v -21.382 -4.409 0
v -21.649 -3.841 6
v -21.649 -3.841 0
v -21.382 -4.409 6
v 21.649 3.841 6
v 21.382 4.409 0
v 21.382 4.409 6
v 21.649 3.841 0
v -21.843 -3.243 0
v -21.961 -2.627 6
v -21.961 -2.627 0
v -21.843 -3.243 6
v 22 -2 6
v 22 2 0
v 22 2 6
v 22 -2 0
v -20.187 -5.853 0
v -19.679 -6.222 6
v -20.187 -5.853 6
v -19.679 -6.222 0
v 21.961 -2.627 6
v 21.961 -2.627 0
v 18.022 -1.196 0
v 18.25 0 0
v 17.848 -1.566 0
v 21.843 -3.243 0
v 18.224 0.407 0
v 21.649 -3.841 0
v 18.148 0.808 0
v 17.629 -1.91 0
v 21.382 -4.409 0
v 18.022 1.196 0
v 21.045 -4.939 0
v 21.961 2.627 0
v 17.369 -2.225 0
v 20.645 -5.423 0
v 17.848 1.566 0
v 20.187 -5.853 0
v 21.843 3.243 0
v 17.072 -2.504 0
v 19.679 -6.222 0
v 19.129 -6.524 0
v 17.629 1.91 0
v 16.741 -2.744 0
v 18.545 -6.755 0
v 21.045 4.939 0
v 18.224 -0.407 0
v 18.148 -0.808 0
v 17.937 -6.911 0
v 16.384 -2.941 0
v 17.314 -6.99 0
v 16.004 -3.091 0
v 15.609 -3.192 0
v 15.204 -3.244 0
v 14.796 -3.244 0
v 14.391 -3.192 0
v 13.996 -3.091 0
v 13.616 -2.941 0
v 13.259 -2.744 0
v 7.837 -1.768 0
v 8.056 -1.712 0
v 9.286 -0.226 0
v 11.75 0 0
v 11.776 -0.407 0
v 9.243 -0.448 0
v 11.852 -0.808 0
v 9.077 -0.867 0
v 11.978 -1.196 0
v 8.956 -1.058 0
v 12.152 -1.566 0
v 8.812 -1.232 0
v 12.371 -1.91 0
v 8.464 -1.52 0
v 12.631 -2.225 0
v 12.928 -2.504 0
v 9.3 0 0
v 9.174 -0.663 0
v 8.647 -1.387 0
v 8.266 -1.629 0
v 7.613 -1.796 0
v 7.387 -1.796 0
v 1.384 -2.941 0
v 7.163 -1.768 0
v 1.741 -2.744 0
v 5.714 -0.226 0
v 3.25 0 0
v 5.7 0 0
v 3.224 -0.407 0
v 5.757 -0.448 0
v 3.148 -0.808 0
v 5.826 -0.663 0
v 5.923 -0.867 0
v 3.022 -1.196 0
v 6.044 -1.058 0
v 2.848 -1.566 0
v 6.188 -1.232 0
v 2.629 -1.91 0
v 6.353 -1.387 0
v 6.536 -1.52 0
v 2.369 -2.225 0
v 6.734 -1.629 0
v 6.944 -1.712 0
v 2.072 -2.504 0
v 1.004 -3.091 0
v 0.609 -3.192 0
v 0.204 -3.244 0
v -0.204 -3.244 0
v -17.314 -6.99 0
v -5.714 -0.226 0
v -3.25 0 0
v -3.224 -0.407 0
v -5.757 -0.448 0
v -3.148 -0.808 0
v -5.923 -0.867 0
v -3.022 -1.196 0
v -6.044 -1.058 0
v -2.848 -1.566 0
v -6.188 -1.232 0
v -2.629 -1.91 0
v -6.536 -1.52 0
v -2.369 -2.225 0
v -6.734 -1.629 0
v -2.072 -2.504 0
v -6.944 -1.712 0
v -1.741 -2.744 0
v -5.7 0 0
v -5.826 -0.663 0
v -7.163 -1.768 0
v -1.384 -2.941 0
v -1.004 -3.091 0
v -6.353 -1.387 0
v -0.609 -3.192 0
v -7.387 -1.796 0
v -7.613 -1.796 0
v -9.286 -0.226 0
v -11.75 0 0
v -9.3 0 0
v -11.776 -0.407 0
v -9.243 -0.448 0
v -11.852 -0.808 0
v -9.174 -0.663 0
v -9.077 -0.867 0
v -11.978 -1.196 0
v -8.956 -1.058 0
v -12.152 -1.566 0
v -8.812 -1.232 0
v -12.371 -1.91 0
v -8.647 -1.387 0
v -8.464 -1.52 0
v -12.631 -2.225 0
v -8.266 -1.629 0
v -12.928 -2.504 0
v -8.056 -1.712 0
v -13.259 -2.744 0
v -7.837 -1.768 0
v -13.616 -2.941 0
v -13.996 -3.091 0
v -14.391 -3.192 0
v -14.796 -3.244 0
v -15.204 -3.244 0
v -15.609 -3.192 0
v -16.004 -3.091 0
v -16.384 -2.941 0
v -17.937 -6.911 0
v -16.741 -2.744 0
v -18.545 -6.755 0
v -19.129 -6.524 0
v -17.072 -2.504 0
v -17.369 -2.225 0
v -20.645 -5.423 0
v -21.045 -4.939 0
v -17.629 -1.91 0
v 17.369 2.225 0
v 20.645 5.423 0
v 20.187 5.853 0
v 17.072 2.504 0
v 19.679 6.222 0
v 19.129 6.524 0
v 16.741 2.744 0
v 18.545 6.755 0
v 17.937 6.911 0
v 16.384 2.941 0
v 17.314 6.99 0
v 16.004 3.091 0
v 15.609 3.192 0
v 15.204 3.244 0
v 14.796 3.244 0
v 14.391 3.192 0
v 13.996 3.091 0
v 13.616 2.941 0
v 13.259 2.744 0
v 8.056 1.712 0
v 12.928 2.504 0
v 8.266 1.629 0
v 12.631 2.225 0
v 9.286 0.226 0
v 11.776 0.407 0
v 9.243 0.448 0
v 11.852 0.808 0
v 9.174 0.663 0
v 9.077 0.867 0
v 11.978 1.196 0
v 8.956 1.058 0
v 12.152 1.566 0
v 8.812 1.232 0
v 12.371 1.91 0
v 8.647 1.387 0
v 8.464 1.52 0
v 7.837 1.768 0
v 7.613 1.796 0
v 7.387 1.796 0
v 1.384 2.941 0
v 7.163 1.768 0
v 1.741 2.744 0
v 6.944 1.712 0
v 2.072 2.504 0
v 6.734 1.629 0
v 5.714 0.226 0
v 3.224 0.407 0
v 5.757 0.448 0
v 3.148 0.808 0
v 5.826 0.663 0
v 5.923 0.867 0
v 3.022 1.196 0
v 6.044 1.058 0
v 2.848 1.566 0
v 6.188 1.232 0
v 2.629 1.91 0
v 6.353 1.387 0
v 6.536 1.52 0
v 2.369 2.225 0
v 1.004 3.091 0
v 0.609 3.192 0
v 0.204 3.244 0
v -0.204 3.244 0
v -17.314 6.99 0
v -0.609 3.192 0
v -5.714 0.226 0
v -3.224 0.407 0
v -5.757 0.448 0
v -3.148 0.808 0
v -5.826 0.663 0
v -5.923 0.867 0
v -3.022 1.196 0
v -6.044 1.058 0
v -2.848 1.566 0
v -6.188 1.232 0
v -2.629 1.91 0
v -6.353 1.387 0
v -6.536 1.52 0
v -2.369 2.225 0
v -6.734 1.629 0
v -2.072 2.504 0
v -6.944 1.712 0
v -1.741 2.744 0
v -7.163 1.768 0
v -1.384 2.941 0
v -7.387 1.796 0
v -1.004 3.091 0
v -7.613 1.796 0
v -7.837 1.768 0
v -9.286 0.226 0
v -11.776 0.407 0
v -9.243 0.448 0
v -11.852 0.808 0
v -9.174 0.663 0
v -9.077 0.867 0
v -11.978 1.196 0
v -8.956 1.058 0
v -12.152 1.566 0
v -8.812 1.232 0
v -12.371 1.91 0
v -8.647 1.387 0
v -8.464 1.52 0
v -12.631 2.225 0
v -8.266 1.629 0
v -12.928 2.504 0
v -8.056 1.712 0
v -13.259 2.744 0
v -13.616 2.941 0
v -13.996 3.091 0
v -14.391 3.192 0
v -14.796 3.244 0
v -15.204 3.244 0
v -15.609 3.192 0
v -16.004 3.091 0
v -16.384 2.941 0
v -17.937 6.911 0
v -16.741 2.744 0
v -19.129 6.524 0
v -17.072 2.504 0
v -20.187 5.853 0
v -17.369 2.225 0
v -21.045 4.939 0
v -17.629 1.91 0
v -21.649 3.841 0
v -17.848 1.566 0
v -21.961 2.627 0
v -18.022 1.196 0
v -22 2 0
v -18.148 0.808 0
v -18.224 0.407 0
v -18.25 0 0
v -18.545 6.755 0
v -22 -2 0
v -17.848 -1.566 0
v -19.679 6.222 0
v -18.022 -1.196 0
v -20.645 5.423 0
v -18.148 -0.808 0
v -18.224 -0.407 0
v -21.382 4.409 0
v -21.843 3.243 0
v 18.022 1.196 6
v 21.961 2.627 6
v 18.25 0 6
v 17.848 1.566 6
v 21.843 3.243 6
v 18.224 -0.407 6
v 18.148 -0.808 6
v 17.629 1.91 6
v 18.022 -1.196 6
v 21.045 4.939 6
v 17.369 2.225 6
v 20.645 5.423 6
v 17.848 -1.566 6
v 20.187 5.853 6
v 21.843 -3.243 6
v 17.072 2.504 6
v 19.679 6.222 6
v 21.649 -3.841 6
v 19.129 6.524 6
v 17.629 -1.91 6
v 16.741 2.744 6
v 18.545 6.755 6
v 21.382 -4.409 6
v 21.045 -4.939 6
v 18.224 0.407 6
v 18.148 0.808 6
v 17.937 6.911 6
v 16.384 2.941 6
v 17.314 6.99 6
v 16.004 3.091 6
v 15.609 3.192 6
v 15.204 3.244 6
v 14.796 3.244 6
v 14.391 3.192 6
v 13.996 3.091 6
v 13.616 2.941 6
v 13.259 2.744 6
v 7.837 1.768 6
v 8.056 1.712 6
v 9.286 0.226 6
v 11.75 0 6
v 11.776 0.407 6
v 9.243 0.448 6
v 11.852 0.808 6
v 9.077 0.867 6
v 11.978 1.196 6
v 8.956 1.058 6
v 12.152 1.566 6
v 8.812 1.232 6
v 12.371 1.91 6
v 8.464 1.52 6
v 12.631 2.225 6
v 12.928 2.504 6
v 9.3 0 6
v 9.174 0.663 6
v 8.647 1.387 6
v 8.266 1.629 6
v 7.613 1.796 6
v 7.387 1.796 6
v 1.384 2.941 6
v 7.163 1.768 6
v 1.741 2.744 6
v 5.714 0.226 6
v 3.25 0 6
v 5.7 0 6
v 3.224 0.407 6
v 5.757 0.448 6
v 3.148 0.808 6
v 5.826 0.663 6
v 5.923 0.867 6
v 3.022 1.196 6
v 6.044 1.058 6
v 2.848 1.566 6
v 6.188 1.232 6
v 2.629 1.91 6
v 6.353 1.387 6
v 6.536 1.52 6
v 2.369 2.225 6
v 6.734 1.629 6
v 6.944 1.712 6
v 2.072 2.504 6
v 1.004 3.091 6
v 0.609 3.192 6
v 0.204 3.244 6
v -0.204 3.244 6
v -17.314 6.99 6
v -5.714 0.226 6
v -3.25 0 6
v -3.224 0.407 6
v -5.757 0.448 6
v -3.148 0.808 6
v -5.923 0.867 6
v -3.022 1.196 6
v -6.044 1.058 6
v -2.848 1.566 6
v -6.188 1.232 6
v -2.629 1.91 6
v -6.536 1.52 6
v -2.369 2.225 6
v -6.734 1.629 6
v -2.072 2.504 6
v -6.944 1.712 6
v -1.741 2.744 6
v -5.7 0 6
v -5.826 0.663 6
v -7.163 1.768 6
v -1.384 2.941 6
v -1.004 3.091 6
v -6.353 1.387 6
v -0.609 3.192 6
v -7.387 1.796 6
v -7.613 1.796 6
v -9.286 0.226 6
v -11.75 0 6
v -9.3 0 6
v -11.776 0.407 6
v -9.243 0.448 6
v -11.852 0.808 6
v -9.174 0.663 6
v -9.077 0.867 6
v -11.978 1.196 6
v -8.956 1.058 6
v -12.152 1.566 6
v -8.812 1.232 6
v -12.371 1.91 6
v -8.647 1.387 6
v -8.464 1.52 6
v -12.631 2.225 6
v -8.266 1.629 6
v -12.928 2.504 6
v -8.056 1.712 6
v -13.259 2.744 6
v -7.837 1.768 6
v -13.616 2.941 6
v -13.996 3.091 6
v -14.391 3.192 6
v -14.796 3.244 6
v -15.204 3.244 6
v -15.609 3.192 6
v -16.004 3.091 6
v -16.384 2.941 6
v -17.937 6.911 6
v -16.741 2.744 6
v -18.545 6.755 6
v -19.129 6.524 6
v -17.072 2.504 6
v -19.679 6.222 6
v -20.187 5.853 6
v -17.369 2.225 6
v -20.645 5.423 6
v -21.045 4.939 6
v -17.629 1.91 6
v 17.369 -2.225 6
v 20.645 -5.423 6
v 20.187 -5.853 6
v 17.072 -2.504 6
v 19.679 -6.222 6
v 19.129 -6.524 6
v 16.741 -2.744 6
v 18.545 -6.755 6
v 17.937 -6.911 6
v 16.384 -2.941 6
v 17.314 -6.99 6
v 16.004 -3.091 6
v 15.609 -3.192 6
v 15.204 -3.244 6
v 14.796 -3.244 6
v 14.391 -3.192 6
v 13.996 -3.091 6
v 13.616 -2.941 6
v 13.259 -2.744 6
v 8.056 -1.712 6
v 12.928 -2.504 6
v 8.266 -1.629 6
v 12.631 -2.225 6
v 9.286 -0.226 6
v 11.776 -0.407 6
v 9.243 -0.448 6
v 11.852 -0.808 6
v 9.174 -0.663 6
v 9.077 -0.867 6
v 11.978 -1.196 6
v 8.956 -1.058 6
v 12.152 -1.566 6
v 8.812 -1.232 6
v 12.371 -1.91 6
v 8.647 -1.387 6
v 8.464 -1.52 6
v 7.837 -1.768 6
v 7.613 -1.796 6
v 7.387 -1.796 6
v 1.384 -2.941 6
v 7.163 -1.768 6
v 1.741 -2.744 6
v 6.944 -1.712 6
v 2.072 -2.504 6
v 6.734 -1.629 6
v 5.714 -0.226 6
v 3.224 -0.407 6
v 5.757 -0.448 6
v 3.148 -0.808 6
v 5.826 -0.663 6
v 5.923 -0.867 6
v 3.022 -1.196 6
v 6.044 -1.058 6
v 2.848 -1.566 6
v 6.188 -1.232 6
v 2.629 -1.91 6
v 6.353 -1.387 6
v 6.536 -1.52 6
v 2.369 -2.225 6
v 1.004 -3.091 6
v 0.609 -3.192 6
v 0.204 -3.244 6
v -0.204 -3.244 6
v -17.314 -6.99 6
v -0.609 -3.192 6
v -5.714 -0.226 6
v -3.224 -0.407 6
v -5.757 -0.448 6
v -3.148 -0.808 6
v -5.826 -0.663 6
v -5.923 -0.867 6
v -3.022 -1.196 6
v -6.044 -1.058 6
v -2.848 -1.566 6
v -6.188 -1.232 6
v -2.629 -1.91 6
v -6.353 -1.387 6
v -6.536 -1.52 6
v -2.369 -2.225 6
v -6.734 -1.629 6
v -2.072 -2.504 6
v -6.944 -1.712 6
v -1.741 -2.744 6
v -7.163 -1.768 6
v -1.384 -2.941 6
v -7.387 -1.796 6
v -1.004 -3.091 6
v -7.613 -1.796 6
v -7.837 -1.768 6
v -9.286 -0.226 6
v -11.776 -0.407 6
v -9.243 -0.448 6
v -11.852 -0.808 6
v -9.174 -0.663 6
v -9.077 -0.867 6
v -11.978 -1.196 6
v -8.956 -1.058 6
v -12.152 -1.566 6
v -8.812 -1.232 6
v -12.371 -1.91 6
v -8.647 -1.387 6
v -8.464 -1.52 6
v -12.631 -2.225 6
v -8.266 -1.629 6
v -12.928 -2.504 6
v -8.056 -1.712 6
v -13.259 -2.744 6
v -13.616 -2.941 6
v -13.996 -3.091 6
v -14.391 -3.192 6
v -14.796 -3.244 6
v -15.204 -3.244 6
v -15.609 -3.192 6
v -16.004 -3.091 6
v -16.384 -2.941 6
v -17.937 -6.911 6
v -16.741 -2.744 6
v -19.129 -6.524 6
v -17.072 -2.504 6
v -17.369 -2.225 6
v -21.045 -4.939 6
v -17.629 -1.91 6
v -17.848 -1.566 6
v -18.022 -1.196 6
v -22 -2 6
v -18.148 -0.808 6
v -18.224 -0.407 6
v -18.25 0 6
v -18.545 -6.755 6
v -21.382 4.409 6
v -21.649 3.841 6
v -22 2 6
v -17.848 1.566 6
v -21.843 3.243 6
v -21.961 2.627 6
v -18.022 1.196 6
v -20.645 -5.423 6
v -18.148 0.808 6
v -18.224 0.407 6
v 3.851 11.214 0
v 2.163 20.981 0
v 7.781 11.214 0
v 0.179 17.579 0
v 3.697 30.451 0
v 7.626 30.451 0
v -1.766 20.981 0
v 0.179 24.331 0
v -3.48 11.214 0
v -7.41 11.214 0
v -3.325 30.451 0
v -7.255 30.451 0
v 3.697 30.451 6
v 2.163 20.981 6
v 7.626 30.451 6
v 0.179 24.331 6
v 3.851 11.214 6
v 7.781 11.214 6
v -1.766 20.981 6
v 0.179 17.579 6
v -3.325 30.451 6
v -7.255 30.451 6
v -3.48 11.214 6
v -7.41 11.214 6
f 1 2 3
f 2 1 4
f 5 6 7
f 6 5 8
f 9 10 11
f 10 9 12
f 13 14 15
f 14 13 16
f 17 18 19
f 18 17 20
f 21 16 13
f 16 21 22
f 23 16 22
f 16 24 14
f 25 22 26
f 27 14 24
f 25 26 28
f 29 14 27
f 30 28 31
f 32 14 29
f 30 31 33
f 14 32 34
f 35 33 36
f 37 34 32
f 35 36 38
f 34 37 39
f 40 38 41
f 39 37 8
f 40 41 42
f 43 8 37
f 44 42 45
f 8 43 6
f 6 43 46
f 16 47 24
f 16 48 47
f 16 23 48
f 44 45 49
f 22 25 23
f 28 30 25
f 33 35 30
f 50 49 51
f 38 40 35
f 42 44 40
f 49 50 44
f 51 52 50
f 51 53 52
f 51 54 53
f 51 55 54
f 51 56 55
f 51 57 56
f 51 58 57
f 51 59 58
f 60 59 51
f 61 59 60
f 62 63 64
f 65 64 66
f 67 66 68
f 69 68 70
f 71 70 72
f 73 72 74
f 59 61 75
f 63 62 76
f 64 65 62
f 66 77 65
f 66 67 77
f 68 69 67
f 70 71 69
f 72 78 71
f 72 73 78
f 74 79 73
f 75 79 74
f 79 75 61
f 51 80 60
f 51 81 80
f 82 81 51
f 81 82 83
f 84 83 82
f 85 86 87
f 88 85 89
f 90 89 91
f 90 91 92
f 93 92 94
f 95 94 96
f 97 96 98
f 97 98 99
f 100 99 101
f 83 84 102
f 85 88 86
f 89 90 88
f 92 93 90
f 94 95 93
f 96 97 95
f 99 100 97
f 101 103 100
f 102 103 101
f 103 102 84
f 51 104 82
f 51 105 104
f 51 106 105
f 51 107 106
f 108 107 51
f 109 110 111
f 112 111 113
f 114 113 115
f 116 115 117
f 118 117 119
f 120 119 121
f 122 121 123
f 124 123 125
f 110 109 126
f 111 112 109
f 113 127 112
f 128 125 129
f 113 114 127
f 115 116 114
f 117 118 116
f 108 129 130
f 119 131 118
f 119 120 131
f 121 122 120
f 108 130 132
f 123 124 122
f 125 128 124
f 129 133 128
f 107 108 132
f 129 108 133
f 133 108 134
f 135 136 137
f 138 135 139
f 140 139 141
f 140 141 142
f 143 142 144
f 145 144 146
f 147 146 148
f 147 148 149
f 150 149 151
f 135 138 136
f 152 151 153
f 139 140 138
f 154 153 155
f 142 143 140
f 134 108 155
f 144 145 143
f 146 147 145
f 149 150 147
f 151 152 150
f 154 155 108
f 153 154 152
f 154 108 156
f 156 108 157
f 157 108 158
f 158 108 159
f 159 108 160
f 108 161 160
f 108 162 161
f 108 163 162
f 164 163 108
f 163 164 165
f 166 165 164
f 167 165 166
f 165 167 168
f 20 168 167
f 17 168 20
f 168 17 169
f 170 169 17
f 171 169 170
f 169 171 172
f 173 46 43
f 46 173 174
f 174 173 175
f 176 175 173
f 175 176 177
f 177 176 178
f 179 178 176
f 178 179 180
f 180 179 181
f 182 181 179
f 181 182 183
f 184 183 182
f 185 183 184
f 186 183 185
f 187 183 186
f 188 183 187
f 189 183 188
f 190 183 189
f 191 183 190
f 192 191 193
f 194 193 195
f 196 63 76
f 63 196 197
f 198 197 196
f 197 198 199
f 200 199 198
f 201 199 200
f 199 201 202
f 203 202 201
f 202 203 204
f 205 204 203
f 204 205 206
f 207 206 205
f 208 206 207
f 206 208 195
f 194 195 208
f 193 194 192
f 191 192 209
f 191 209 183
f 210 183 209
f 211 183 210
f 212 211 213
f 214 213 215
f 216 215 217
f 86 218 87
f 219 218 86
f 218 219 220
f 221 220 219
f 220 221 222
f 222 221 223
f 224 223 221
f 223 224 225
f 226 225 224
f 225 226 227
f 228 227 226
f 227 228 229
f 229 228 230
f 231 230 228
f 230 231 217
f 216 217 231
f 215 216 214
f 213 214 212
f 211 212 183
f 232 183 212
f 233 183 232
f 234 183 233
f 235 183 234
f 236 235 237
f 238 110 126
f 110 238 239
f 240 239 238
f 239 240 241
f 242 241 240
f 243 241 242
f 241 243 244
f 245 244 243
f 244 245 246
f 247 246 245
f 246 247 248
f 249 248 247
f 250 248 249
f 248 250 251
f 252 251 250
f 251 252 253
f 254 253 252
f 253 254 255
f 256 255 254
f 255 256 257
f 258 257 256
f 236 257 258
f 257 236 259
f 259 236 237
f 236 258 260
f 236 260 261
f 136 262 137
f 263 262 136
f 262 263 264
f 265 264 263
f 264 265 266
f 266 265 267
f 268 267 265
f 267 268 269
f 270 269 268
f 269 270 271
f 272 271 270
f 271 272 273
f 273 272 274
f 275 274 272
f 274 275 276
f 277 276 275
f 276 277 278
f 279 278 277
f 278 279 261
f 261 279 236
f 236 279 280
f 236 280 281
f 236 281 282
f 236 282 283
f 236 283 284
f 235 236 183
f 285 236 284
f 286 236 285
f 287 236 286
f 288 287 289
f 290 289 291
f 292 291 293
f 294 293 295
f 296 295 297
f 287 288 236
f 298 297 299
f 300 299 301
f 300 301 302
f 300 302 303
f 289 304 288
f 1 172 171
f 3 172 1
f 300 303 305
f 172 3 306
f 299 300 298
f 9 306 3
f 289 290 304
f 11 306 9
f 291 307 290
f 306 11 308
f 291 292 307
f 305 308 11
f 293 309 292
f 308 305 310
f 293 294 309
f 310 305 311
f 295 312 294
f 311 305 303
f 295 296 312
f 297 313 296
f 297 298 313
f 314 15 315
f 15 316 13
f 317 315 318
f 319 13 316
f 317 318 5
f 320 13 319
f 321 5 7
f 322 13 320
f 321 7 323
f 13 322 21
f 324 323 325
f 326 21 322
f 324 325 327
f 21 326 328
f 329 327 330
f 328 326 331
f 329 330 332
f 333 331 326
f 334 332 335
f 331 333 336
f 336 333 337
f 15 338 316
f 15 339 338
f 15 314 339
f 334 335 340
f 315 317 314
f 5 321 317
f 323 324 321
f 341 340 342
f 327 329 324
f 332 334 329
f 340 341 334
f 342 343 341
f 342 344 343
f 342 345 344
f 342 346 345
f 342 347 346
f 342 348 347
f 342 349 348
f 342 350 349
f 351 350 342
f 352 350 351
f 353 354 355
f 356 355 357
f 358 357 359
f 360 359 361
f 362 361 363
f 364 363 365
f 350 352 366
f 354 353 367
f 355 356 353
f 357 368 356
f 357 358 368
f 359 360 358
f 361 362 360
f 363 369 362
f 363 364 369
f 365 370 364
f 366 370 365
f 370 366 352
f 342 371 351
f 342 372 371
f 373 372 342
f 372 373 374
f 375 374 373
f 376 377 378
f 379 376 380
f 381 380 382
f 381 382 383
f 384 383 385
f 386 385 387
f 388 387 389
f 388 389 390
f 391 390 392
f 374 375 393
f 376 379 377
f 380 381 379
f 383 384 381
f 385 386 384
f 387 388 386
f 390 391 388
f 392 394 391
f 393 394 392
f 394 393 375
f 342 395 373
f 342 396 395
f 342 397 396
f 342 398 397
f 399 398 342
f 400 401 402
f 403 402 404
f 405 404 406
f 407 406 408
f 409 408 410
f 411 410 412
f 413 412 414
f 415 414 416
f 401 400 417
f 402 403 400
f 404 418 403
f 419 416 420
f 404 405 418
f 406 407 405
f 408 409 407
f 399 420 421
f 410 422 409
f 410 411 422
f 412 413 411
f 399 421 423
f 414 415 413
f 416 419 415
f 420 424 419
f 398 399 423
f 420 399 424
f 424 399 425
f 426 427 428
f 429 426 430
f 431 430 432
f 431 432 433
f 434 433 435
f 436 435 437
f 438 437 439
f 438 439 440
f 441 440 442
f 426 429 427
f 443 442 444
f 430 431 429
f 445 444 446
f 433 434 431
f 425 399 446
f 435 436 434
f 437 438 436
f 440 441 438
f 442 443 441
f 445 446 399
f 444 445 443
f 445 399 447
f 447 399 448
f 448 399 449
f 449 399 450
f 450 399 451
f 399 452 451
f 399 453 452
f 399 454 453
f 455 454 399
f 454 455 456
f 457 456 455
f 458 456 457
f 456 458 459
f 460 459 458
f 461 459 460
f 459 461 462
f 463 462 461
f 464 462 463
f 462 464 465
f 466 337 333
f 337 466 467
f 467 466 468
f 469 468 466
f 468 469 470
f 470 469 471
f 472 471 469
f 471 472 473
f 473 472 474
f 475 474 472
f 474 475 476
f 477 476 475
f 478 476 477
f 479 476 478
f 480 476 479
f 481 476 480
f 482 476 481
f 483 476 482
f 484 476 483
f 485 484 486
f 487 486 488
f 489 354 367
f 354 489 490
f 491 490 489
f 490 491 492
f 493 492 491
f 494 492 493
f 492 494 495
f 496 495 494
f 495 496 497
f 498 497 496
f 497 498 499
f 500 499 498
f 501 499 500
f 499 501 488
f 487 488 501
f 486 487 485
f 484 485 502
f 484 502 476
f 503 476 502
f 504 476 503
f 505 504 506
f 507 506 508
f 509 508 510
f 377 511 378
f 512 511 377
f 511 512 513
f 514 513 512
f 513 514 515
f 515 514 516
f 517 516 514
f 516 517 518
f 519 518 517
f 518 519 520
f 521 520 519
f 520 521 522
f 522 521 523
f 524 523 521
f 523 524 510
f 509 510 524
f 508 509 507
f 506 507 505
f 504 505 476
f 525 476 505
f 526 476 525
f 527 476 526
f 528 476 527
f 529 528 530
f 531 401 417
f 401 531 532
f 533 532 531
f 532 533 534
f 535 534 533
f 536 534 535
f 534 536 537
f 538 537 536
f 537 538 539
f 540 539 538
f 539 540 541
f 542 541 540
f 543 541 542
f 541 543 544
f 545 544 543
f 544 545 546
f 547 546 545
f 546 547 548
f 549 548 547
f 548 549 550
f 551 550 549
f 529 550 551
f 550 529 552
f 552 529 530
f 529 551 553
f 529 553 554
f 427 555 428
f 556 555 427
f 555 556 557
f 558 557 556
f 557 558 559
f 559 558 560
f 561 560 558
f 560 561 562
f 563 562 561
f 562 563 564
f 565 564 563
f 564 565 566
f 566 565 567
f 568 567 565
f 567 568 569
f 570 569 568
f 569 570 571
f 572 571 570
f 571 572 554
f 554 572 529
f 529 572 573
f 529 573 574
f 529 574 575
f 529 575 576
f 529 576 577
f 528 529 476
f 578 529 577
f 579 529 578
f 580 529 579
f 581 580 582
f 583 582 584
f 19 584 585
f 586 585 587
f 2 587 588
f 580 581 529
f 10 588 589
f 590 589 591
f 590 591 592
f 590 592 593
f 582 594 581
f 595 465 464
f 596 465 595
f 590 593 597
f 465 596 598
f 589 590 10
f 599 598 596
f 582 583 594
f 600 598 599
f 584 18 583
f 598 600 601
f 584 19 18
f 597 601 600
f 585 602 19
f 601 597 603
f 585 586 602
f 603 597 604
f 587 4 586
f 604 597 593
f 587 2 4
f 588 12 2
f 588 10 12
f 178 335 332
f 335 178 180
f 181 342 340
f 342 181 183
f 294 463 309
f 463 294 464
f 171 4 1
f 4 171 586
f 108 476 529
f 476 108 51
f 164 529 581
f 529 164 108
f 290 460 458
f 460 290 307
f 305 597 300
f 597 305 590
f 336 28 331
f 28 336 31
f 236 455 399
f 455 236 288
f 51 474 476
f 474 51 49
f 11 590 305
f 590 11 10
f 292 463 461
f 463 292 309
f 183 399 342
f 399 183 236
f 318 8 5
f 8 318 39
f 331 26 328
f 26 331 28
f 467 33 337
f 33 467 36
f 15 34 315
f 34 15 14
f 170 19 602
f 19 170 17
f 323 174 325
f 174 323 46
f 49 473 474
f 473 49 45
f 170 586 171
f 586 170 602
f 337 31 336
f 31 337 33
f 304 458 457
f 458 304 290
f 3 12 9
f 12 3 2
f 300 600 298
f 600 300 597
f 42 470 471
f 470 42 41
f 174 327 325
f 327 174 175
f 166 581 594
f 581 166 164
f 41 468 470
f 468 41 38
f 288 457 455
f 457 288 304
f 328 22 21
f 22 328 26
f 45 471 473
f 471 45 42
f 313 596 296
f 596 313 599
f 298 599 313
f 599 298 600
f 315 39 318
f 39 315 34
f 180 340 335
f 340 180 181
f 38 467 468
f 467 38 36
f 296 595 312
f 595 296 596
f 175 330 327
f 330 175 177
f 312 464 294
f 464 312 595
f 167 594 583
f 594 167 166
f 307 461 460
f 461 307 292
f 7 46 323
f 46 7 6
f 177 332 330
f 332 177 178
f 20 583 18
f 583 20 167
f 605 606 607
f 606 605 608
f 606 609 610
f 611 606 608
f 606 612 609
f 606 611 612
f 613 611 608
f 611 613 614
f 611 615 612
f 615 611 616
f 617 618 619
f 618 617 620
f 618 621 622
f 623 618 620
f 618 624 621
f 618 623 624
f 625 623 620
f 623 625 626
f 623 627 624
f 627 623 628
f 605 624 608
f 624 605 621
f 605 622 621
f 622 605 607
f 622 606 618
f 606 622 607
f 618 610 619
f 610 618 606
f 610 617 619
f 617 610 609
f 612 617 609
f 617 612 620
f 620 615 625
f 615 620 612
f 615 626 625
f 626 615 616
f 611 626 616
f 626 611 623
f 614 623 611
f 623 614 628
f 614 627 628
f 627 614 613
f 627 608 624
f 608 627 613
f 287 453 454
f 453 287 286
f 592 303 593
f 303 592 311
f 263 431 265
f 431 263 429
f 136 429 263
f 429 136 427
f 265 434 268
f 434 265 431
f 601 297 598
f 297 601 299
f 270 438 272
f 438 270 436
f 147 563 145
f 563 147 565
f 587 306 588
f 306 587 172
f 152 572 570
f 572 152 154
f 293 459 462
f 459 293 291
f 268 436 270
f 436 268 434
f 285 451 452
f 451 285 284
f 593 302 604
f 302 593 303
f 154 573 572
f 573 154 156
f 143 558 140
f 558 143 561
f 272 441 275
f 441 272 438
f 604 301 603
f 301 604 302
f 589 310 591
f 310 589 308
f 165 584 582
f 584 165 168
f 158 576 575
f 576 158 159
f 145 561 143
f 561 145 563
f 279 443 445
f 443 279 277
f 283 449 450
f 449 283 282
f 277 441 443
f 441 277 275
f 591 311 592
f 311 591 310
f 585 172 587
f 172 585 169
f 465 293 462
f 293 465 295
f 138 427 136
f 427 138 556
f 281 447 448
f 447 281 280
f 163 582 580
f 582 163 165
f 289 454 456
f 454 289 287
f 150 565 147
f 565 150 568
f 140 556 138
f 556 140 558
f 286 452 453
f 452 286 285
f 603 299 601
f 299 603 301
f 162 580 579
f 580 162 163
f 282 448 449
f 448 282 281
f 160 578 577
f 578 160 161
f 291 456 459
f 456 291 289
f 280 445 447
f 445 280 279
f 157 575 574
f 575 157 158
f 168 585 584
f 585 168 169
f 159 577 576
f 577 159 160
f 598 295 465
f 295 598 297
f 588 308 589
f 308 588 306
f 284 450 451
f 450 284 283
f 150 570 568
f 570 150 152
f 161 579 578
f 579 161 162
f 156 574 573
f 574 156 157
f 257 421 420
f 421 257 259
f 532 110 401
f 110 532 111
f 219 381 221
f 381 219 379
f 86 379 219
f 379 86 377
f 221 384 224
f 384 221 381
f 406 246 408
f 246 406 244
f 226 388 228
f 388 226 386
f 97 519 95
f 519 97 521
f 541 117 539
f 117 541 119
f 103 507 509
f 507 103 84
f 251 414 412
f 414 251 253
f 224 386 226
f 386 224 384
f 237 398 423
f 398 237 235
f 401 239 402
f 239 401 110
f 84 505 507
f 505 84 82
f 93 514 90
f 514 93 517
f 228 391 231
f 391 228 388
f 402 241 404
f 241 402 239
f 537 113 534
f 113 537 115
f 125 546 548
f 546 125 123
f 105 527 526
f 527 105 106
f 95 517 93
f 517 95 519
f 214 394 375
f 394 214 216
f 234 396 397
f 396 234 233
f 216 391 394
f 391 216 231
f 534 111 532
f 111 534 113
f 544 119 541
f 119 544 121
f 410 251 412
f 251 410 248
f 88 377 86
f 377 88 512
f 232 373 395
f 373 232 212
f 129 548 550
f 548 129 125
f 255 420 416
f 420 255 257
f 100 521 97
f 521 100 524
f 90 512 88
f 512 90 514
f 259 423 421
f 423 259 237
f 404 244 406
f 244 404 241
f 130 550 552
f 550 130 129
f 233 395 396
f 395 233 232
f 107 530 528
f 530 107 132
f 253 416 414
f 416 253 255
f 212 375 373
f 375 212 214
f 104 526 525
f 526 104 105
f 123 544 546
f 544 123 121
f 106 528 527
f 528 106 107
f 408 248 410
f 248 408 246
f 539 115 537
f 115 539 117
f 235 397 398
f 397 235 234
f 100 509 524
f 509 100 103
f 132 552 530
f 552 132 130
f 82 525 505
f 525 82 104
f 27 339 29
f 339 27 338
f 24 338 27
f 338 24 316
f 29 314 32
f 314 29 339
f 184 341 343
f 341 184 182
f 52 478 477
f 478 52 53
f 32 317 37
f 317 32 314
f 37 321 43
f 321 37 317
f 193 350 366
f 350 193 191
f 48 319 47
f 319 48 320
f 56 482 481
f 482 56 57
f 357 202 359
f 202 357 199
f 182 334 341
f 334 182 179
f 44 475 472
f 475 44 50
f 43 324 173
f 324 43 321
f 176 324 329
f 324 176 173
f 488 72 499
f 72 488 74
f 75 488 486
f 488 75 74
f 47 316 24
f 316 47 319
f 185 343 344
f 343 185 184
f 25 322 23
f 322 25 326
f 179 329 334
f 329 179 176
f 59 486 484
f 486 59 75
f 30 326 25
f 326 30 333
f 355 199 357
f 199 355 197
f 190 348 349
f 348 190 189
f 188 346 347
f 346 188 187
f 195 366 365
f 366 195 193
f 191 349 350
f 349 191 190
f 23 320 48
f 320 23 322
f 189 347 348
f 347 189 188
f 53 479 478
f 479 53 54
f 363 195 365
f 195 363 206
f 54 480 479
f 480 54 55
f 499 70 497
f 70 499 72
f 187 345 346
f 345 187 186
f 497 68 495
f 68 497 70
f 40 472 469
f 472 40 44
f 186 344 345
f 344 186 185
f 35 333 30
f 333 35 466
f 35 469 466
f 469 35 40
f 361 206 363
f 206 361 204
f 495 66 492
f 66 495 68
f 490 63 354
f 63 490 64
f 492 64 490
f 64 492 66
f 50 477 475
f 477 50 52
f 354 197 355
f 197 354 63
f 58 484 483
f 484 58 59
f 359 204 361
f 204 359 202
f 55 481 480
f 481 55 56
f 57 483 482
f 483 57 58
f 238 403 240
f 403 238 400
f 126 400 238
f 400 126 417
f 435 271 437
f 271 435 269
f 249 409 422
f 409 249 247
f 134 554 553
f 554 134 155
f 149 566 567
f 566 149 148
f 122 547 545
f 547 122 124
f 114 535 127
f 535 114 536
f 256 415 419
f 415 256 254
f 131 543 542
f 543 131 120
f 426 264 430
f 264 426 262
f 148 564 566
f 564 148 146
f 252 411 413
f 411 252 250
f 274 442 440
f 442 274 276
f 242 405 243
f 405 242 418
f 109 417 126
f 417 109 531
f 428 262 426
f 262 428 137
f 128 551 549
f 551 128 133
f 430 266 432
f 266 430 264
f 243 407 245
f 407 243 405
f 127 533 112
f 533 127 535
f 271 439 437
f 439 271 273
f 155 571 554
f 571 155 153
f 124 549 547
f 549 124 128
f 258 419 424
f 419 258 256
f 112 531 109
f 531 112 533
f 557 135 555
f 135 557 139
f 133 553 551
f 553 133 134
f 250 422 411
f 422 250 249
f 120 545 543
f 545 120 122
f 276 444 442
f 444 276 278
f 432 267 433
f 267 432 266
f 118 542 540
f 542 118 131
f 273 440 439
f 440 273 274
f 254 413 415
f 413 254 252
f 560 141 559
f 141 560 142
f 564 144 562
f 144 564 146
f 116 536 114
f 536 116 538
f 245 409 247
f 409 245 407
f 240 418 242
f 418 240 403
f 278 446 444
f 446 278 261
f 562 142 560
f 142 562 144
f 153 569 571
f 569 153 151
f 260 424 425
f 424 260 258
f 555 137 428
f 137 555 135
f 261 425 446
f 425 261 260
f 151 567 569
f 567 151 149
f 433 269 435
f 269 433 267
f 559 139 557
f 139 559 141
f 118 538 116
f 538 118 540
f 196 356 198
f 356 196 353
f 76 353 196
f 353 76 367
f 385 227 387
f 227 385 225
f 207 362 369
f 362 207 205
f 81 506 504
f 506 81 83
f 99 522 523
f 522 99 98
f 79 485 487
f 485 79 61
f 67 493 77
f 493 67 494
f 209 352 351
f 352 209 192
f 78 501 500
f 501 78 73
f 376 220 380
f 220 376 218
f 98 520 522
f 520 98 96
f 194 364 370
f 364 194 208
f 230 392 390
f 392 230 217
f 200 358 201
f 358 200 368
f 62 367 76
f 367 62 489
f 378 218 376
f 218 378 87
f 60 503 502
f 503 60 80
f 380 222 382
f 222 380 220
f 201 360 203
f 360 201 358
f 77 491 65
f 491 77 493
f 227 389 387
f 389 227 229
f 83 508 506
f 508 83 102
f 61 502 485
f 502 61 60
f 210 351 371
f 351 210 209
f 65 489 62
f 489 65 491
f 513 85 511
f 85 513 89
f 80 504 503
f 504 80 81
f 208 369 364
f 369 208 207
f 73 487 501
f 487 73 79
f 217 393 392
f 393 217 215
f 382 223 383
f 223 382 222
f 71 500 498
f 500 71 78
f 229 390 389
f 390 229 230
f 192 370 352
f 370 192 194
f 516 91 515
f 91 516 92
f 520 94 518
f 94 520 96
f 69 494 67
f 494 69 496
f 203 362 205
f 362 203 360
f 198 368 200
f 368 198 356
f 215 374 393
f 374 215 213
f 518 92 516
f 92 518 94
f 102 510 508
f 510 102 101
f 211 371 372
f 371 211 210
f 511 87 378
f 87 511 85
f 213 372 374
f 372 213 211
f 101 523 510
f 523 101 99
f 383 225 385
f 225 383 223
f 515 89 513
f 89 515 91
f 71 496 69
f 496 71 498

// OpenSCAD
$fn = 50;


difference() {
	union() {
		hull() {
			translate(v = [-17.0000000000, 2.0000000000, 0]) {
				cylinder(h = 6, r = 5);
			}
			translate(v = [17.0000000000, 2.0000000000, 0]) {
				cylinder(h = 6, r = 5);
			}
			translate(v = [-17.0000000000, -2.0000000000, 0]) {
				cylinder(h = 6, r = 5);
			}
			translate(v = [17.0000000000, -2.0000000000, 0]) {
				cylinder(h = 6, r = 5);
			}
		}
		translate(v = [0, 30.0000000000, 0]) {
			linear_extrude(height = 6) {
				text(font = "DejaVu Sans Mono:style=Bold", halign = "center", size = 19.0000000000, text = "X", valign = "top");
			}
		}
	}
	union() {
		translate(v = [-15.0000000000, 0.0000000000, 0]) {
			translate(v = [0, 0, -100]) {
				cylinder(h = 200, r = 3.2500000000);
			}
		}
		translate(v = [0, 0, -100]) {
			cylinder(h = 200, r = 3.2500000000);
		}
		translate(v = [15.0000000000, 0.0000000000, 0]) {
			translate(v = [0, 0, -100]) {
				cylinder(h = 200, r = 3.2500000000);
			}
		}
		translate(v = [-15.0000000000, 0.0000000000, 0]) {
			translate(v = [0, 0, -100]) {
				cylinder(h = 200, r = 1.8000000000);
			}
		}
		translate(v = [-7.5000000000, 0.0000000000, 0]) {
			translate(v = [0, 0, -100]) {
				cylinder(h = 200, r = 1.8000000000);
			}
		}
		translate(v = [0, 0, -100]) {
			cylinder(h = 200, r = 1.8000000000);
		}
		translate(v = [7.5000000000, 0.0000000000, 0]) {
			translate(v = [0, 0, -100]) {
				cylinder(h = 200, r = 1.8000000000);
			}
		}
		translate(v = [15.0000000000, 0.0000000000, 0]) {
			translate(v = [0, 0, -100]) {
				cylinder(h = 200, r = 1.8000000000);
			}
		}
	}
}
